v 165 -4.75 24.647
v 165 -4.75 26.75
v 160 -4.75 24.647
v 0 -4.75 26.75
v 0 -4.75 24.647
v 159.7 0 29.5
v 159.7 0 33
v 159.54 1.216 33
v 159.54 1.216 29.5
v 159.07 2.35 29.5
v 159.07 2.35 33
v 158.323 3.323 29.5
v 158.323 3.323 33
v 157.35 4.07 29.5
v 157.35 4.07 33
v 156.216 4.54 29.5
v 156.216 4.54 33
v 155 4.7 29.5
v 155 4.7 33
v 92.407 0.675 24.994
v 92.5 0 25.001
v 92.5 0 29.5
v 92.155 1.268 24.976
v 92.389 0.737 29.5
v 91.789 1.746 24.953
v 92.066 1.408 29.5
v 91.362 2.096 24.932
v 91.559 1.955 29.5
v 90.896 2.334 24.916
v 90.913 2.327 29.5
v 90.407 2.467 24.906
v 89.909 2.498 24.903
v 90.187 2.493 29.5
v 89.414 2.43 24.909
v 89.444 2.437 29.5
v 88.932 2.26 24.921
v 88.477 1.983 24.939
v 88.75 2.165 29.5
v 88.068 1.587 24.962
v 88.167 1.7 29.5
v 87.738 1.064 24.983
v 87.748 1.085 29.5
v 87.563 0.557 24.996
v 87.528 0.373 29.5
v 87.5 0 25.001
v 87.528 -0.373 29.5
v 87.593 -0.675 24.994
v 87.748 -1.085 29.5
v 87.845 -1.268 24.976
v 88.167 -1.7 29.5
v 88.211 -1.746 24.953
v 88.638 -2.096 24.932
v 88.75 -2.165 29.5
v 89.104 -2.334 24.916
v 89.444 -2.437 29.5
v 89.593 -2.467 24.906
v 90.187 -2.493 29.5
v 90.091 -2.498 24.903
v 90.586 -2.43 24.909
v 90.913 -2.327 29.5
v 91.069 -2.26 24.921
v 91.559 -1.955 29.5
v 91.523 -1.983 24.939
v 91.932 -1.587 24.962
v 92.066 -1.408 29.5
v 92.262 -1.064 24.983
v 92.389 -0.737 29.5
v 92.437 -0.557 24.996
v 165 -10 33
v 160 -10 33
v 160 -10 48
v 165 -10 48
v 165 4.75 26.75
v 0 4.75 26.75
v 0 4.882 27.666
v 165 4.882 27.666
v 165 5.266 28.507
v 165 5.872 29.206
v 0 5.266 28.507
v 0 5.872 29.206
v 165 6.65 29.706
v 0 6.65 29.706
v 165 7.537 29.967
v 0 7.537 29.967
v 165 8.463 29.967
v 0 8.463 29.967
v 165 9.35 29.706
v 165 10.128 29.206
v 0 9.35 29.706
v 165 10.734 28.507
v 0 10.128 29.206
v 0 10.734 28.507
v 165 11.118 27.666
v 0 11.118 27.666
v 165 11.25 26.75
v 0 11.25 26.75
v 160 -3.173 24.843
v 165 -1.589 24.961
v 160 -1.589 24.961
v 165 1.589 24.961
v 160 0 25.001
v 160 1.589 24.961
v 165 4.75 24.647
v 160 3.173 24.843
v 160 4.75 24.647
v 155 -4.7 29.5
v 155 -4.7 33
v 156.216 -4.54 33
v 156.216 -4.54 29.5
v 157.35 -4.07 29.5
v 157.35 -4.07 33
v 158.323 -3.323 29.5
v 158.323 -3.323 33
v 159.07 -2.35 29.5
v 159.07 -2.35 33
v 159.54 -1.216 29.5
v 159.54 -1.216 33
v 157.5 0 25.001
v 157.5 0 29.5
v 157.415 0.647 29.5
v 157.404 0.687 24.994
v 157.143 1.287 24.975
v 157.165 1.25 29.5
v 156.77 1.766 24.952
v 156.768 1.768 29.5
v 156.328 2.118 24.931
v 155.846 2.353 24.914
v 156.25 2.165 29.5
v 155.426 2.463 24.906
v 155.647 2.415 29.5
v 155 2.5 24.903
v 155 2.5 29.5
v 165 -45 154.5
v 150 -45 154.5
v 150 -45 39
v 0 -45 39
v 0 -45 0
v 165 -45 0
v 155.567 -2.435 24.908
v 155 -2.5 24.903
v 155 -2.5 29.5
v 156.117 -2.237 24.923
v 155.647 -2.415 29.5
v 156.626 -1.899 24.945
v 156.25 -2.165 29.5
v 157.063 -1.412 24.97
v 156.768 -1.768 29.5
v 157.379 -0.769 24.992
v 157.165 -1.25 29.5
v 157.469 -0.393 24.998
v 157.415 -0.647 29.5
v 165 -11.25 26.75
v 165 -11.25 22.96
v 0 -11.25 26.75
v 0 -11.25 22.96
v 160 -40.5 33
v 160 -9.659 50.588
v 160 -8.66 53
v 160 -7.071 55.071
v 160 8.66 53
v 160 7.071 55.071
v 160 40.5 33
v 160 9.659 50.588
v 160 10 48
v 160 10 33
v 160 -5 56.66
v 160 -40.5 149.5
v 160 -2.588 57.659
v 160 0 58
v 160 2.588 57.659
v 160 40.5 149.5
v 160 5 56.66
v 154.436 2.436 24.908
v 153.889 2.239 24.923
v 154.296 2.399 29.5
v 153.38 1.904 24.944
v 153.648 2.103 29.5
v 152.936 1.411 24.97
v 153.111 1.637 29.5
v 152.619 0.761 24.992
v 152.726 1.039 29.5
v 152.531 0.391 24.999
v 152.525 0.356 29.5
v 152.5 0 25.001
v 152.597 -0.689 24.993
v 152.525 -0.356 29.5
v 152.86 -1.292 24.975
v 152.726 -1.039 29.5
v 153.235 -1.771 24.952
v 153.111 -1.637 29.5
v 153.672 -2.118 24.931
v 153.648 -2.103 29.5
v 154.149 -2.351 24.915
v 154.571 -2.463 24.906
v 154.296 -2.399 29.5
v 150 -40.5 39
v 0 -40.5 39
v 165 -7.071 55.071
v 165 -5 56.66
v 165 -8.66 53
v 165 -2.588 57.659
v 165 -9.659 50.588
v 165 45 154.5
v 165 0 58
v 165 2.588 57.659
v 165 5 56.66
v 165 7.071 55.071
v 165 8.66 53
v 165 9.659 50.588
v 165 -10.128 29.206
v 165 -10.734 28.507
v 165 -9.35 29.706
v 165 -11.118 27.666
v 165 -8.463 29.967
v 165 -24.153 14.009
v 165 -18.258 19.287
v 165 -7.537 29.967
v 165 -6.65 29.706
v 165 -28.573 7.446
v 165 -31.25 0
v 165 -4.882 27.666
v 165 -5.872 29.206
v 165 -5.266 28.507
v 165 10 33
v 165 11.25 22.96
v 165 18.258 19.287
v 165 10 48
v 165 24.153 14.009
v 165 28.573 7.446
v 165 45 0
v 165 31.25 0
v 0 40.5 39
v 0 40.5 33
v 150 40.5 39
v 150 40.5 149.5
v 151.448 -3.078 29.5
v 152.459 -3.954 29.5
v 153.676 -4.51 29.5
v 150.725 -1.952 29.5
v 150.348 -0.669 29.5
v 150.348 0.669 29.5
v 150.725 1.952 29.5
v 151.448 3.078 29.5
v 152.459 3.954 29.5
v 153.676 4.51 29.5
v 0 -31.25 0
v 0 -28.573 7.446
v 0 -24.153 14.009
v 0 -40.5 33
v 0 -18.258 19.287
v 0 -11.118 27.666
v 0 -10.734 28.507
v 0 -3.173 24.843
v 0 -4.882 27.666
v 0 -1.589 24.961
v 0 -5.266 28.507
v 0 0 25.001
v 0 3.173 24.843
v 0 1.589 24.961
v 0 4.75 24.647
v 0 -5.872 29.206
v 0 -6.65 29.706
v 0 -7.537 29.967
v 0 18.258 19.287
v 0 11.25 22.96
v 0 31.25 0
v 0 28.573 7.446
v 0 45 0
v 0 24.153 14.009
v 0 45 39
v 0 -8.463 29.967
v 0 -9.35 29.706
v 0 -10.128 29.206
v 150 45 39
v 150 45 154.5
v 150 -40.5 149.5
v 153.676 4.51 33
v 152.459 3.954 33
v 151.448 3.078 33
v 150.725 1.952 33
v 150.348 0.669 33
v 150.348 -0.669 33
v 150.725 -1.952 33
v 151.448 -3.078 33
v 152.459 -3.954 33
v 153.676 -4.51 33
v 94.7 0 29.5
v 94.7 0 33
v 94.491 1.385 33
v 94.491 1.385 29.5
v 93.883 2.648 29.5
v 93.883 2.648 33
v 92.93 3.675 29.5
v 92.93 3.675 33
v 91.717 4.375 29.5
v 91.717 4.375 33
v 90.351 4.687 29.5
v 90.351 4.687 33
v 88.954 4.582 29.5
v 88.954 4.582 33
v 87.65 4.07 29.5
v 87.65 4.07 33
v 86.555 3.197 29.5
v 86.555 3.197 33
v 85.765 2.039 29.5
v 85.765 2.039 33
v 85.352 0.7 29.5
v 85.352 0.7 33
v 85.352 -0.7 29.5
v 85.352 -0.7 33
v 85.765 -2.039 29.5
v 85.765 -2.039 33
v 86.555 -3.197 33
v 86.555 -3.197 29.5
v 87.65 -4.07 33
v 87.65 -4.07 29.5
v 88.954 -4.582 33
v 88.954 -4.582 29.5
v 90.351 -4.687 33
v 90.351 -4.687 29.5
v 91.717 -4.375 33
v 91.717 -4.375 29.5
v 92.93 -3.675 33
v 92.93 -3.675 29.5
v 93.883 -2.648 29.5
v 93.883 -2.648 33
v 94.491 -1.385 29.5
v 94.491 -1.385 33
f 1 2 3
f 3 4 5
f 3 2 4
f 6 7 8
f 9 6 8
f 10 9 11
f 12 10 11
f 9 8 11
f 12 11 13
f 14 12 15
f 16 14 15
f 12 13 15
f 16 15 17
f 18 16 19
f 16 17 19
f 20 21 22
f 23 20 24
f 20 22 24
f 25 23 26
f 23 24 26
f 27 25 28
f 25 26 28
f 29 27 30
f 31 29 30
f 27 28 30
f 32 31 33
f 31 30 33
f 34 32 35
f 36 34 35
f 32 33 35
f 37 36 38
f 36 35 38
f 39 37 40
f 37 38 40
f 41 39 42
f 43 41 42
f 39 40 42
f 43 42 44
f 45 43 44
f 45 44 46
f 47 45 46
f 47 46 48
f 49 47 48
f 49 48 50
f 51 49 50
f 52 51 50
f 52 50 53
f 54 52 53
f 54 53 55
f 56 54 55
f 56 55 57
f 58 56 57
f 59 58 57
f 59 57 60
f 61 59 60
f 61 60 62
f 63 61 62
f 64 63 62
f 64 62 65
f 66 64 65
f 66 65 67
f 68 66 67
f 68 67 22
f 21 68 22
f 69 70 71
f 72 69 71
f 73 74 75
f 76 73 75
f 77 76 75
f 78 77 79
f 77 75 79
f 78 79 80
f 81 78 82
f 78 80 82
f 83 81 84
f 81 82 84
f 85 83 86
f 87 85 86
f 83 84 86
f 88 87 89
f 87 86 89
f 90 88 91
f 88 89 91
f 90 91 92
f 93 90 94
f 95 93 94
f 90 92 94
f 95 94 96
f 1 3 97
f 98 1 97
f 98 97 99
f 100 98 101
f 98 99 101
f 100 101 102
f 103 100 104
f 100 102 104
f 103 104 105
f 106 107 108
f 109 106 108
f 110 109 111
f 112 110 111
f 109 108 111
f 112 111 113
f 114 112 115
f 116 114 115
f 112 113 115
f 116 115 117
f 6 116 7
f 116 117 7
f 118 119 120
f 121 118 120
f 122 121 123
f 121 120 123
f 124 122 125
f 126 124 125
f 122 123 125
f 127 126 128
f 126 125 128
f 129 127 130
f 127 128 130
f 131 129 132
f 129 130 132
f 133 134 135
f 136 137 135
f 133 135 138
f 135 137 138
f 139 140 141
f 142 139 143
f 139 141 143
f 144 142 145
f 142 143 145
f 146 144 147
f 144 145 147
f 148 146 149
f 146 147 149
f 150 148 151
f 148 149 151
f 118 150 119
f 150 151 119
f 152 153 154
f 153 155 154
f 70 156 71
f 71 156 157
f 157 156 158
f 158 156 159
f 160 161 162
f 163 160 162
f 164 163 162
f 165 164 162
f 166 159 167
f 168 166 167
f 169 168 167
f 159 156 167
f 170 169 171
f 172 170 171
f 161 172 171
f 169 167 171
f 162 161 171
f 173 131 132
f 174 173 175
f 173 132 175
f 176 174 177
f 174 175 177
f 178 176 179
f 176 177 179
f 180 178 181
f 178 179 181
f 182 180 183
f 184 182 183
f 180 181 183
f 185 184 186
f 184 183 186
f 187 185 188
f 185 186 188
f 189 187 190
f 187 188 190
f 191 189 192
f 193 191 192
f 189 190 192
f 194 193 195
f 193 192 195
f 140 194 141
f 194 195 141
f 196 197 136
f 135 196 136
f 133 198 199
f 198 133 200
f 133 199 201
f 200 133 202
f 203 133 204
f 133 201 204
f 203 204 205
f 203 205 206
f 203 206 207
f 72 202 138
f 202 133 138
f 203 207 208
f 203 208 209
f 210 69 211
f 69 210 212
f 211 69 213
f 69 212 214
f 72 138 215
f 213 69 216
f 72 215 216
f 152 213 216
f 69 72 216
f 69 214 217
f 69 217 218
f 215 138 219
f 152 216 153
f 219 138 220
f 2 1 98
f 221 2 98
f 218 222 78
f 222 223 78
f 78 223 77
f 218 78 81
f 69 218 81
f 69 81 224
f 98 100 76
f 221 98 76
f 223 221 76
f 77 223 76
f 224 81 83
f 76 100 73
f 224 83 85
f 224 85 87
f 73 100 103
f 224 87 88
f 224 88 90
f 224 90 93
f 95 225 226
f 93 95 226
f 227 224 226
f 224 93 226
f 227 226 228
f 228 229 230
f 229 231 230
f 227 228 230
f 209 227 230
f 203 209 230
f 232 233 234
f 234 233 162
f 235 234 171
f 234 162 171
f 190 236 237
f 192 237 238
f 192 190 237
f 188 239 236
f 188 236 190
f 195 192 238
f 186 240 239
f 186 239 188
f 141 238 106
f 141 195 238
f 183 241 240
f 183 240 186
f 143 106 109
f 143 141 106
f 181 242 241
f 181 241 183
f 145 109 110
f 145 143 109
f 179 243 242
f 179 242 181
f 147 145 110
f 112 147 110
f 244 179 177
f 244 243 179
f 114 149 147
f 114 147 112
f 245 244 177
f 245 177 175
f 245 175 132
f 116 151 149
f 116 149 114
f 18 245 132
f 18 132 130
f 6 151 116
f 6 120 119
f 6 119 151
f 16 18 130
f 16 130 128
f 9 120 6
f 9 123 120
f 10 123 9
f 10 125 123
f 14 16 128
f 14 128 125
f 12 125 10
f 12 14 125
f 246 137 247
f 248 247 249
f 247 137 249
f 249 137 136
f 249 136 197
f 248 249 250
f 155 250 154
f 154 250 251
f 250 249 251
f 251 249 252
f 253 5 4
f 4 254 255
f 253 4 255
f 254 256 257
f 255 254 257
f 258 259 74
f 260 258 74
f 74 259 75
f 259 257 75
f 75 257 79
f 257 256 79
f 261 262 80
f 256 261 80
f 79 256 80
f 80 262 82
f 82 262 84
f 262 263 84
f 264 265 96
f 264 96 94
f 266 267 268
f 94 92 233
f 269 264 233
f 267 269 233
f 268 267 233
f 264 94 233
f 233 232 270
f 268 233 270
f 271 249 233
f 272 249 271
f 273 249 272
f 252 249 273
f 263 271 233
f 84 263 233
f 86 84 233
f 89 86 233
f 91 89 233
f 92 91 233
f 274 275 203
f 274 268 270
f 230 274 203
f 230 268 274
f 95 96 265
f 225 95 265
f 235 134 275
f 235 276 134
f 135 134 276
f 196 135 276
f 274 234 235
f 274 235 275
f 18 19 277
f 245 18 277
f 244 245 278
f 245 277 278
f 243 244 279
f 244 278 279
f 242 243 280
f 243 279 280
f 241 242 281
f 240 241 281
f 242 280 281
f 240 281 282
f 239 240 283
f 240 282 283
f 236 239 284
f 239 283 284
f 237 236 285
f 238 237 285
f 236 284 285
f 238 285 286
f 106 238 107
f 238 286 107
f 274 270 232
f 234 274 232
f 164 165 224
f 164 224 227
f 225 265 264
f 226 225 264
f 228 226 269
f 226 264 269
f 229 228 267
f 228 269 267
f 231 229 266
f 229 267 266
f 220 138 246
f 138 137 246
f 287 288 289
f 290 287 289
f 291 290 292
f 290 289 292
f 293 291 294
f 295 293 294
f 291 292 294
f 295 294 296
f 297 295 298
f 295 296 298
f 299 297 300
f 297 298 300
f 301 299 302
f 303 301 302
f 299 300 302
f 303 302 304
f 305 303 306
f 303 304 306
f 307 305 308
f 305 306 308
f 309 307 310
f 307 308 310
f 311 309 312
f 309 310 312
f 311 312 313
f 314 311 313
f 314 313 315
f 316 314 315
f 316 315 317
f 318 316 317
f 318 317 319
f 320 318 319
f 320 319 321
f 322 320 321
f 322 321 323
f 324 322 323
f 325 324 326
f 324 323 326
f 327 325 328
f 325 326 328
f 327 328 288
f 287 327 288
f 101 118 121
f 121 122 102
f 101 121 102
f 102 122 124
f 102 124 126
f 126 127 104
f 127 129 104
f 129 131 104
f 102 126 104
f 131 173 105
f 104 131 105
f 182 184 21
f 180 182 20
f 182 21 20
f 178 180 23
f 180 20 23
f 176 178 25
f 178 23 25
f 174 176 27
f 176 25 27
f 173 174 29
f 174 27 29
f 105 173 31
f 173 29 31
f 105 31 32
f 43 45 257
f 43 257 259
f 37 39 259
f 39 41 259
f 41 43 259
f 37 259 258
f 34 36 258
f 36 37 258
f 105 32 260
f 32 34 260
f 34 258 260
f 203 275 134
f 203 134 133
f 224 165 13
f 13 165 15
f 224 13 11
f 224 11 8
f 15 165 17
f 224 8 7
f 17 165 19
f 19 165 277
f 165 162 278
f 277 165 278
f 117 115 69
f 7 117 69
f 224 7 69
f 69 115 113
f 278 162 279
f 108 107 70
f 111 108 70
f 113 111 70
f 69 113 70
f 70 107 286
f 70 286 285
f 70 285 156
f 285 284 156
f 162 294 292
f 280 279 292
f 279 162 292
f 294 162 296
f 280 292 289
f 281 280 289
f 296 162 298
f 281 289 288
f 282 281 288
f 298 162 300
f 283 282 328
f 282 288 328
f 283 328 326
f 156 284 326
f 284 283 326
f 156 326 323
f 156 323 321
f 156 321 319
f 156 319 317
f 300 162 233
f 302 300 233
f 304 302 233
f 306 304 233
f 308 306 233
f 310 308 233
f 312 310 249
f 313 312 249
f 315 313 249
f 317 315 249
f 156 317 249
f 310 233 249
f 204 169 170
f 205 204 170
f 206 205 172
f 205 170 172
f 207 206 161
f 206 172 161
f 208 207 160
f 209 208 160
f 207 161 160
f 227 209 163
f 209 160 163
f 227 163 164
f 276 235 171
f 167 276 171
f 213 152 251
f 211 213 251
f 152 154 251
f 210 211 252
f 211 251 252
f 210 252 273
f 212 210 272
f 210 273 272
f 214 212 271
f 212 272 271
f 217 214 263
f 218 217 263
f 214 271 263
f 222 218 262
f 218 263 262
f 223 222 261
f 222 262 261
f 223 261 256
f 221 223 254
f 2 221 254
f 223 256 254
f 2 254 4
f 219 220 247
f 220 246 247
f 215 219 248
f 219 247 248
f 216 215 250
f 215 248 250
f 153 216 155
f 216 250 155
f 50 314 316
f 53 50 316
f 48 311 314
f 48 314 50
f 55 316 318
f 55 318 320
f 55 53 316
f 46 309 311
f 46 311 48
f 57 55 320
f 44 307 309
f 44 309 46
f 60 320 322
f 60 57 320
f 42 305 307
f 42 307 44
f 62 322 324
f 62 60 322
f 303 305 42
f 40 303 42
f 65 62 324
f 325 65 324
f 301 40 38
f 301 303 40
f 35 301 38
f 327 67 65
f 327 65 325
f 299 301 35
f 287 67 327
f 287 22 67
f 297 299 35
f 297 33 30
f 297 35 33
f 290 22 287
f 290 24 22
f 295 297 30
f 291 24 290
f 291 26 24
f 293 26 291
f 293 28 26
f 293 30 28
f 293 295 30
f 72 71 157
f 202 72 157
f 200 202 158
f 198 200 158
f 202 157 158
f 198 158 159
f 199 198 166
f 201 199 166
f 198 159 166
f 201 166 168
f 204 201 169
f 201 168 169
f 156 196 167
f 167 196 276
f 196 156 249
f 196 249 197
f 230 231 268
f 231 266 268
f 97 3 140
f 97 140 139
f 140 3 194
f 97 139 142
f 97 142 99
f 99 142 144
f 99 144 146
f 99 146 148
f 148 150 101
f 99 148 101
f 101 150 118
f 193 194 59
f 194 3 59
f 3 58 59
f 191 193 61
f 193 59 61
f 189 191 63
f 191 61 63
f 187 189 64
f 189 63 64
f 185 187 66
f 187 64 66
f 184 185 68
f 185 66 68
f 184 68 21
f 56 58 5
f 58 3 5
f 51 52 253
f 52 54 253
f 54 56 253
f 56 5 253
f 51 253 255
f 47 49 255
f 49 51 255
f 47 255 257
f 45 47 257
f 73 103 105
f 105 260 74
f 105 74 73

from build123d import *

# Parameters (mm, degrees)
F1_DEPTH  = 160
F3_DEPTH  = 5
F4_W      = 4.5
F4_H      = 110.5
F5_DEPTH  = 10
F6_W      = 15
F6_H      = 90
F7_DEPTH  = 5
F8_R      = 2.5
F9_DEPTH  = 33.001
F8_R_2    = 4.7
F10_DEPTH = 3.5
F11_W     = 10
F11_H     = 15
F12_DEPTH = 5.0010001


with BuildPart() as f1:
    # F0 (on Right) → F1 (new body)
    with BuildSketch(Plane.YZ):
        with BuildLine():
            ThreePointArc((-4.75, 24.6467332166), (-2.3815922354, 24.9122273292), (0, 25.0008889767))
            Line((0, 25.0008889767), (0, 33))
            Line((0, 33), (-40.5, 33))
            Line((-40.5, 33), (-40.5, 39))
            Line((-40.5, 39), (-45, 39))
            Line((-45, 39), (-45, 0))
            Line((-45, 0), (-31.25, 0))
            ThreePointArc((-31.25, 0), (-24.152761856, 14.0086402639), (-11.25, 22.960261782))
            Line((-11.25, 22.960261782), (-11.25, 26.75))
            ThreePointArc((-11.25, 26.75), (-8, 30), (-4.75, 26.75))
            Line((-4.75, 26.75), (-4.75, 24.6467332166))
        make_face()
        with BuildLine():
            Line((0, 33), (0, 25.0008889767))
            ThreePointArc((0, 25.0008889767), (2.3815922354, 24.9122273292), (4.75, 24.6467332166))
            Line((4.75, 24.6467332166), (4.75, 26.75))
            ThreePointArc((4.75, 26.75), (8, 30), (11.25, 26.75))
            Line((11.25, 26.75), (11.25, 22.960261782))
            ThreePointArc((11.25, 22.960261782), (24.152761856, 14.0086402639), (31.25, 0))
            Line((31.25, 0), (45, 0))
            Line((45, 0), (45, 39))
            Line((45, 39), (40.5, 39))
            Line((40.5, 39), (40.5, 33))
            Line((40.5, 33), (0, 33))
        make_face()
    extrude(amount=F1_DEPTH)

    # F2 (on face) → F3 (join)
    with BuildSketch(Plane.YZ.offset(160)):
        with BuildLine():
            ThreePointArc((11.25, 22.960261782), (24.152761856, 14.0086402639), (31.25, 0))
            Line((31.25, 0), (45, 0))
            Line((45, 0), (45, 39))
            Line((45, 39), (40.5, 39))
            Line((40.5, 39), (40.5, 33))
            Line((40.5, 33), (-40.5, 33))
            Line((-40.5, 33), (-40.5, 39))
            Line((-40.5, 39), (-45, 39))
            Line((-45, 39), (-45, 0))
            Line((-45, 0), (-31.25, 0))
            ThreePointArc((-31.25, 0), (-24.152761856, 14.0086402639), (-11.25, 22.960261782))
            Line((-11.25, 22.960261782), (-11.25, 26.75))
            ThreePointArc((-11.25, 26.75), (-8, 30), (-4.75, 26.75))
            Line((-4.75, 26.75), (-4.75, 24.6467332166))
            ThreePointArc((-4.75, 24.6467332166), (0, 25.0008889767), (4.75, 24.6467332166))
            Line((4.75, 24.6467332166), (4.75, 26.75))
            ThreePointArc((4.75, 26.75), (8, 30), (11.25, 26.75))
            Line((11.25, 26.75), (11.25, 22.960261782))
        make_face()
        Polygon((40.5, 39), (45, 39), (45, 149.5), (-45, 149.5), (-45, 39), (-40.5, 39), (-40.5, 33), (40.5, 33), align=None)
    extrude(amount=F3_DEPTH)

    # F4 (on face) → F5 (join)
    with BuildSketch(Plane(origin=(160, 0, 0), x_dir=(0, -1, 0), z_dir=(-1, 0, 0))):
        with Locations((-42.75, 94.25)):
            Rectangle(F4_W, F4_H)
        with Locations((42.75, 94.25)):
            Rectangle(F4_W, F4_H)
    extrude(amount=F5_DEPTH)

    # F6 (on face) → F7 (join)
    with BuildSketch(Plane.XY.offset(149.5)):
        with Locations((157.5, 0)):
            Rectangle(F6_W, F6_H)
    extrude(amount=F7_DEPTH)

    # F8 (on face) → F9 (cut, through all)
    with BuildSketch(Plane.XY.offset(33)):
        with BuildLine():
            Line((155, 2.5), (155, -2.5))
            ThreePointArc((155, -2.5), (156.767766953, -1.767766953), (157.5, 0))
            ThreePointArc((157.5, 0), (156.767766953, 1.767766953), (155, 2.5))
        make_face()
        with BuildLine():
            ThreePointArc((155, 2.5), (152.5, 0), (155, -2.5))
            Line((155, -2.5), (155, 2.5))
        make_face()
        with Locations((90, 0)):
            Circle(F8_R)
    extrude(amount=-F9_DEPTH, mode=Mode.SUBTRACT)

    # F8 (on face) → F10 (cut)
    with BuildSketch(Plane.XY.offset(33)):
        with BuildLine():
            ThreePointArc((155, 4.7), (150.3, 0), (155, -4.7))
            Line((155, -4.7), (155, -2.5))
            ThreePointArc((155, -2.5), (152.5, 0), (155, 2.5))
            Line((155, 2.5), (155, 4.7))
        make_face()
        with BuildLine():
            Line((155, -2.5), (155, -4.7))
            ThreePointArc((155, -4.7), (158.3234018716, -3.3234018716), (159.7, 0))
            ThreePointArc((159.7, 0), (158.3234018716, 3.3234018716), (155, 4.7))
            Line((155, 4.7), (155, 2.5))
            ThreePointArc((155, 2.5), (156.767766953, 1.767766953), (157.5, 0))
            ThreePointArc((157.5, 0), (156.767766953, -1.767766953), (155, -2.5))
        make_face()
        with Locations((90, 0)):
            Circle(F8_R_2)
        with Locations((90, 0)):
            Circle(F8_R, mode=Mode.SUBTRACT)
    extrude(amount=-F10_DEPTH, mode=Mode.SUBTRACT)

    # F11 (on face) → F12 (cut, through all)
    with BuildSketch(Plane(origin=(160, 0, 0), x_dir=(0, -1, 0), z_dir=(-1, 0, 0))):
        with Locations((5, 40.5)):
            Rectangle(F11_W, F11_H)
        with Locations((-5, 40.5)):
            Rectangle(F11_W, F11_H)
        with BuildLine():
            Line((0, 48), (10, 48))
            ThreePointArc((10, 48), (7.071067816, 55.0710678077), (1.18e-08, 58))
            Line((0, 58), (0, 48))
        make_face()
        with BuildLine():
            Line((-10, 48), (0, 48))
            Line((0, 48), (0, 58))
            ThreePointArc((1.18e-08, 58), (-7.0710678077, 55.071067816), (-10, 48))
        make_face()
    extrude(amount=-F12_DEPTH, mode=Mode.SUBTRACT)


solid = f1.part
